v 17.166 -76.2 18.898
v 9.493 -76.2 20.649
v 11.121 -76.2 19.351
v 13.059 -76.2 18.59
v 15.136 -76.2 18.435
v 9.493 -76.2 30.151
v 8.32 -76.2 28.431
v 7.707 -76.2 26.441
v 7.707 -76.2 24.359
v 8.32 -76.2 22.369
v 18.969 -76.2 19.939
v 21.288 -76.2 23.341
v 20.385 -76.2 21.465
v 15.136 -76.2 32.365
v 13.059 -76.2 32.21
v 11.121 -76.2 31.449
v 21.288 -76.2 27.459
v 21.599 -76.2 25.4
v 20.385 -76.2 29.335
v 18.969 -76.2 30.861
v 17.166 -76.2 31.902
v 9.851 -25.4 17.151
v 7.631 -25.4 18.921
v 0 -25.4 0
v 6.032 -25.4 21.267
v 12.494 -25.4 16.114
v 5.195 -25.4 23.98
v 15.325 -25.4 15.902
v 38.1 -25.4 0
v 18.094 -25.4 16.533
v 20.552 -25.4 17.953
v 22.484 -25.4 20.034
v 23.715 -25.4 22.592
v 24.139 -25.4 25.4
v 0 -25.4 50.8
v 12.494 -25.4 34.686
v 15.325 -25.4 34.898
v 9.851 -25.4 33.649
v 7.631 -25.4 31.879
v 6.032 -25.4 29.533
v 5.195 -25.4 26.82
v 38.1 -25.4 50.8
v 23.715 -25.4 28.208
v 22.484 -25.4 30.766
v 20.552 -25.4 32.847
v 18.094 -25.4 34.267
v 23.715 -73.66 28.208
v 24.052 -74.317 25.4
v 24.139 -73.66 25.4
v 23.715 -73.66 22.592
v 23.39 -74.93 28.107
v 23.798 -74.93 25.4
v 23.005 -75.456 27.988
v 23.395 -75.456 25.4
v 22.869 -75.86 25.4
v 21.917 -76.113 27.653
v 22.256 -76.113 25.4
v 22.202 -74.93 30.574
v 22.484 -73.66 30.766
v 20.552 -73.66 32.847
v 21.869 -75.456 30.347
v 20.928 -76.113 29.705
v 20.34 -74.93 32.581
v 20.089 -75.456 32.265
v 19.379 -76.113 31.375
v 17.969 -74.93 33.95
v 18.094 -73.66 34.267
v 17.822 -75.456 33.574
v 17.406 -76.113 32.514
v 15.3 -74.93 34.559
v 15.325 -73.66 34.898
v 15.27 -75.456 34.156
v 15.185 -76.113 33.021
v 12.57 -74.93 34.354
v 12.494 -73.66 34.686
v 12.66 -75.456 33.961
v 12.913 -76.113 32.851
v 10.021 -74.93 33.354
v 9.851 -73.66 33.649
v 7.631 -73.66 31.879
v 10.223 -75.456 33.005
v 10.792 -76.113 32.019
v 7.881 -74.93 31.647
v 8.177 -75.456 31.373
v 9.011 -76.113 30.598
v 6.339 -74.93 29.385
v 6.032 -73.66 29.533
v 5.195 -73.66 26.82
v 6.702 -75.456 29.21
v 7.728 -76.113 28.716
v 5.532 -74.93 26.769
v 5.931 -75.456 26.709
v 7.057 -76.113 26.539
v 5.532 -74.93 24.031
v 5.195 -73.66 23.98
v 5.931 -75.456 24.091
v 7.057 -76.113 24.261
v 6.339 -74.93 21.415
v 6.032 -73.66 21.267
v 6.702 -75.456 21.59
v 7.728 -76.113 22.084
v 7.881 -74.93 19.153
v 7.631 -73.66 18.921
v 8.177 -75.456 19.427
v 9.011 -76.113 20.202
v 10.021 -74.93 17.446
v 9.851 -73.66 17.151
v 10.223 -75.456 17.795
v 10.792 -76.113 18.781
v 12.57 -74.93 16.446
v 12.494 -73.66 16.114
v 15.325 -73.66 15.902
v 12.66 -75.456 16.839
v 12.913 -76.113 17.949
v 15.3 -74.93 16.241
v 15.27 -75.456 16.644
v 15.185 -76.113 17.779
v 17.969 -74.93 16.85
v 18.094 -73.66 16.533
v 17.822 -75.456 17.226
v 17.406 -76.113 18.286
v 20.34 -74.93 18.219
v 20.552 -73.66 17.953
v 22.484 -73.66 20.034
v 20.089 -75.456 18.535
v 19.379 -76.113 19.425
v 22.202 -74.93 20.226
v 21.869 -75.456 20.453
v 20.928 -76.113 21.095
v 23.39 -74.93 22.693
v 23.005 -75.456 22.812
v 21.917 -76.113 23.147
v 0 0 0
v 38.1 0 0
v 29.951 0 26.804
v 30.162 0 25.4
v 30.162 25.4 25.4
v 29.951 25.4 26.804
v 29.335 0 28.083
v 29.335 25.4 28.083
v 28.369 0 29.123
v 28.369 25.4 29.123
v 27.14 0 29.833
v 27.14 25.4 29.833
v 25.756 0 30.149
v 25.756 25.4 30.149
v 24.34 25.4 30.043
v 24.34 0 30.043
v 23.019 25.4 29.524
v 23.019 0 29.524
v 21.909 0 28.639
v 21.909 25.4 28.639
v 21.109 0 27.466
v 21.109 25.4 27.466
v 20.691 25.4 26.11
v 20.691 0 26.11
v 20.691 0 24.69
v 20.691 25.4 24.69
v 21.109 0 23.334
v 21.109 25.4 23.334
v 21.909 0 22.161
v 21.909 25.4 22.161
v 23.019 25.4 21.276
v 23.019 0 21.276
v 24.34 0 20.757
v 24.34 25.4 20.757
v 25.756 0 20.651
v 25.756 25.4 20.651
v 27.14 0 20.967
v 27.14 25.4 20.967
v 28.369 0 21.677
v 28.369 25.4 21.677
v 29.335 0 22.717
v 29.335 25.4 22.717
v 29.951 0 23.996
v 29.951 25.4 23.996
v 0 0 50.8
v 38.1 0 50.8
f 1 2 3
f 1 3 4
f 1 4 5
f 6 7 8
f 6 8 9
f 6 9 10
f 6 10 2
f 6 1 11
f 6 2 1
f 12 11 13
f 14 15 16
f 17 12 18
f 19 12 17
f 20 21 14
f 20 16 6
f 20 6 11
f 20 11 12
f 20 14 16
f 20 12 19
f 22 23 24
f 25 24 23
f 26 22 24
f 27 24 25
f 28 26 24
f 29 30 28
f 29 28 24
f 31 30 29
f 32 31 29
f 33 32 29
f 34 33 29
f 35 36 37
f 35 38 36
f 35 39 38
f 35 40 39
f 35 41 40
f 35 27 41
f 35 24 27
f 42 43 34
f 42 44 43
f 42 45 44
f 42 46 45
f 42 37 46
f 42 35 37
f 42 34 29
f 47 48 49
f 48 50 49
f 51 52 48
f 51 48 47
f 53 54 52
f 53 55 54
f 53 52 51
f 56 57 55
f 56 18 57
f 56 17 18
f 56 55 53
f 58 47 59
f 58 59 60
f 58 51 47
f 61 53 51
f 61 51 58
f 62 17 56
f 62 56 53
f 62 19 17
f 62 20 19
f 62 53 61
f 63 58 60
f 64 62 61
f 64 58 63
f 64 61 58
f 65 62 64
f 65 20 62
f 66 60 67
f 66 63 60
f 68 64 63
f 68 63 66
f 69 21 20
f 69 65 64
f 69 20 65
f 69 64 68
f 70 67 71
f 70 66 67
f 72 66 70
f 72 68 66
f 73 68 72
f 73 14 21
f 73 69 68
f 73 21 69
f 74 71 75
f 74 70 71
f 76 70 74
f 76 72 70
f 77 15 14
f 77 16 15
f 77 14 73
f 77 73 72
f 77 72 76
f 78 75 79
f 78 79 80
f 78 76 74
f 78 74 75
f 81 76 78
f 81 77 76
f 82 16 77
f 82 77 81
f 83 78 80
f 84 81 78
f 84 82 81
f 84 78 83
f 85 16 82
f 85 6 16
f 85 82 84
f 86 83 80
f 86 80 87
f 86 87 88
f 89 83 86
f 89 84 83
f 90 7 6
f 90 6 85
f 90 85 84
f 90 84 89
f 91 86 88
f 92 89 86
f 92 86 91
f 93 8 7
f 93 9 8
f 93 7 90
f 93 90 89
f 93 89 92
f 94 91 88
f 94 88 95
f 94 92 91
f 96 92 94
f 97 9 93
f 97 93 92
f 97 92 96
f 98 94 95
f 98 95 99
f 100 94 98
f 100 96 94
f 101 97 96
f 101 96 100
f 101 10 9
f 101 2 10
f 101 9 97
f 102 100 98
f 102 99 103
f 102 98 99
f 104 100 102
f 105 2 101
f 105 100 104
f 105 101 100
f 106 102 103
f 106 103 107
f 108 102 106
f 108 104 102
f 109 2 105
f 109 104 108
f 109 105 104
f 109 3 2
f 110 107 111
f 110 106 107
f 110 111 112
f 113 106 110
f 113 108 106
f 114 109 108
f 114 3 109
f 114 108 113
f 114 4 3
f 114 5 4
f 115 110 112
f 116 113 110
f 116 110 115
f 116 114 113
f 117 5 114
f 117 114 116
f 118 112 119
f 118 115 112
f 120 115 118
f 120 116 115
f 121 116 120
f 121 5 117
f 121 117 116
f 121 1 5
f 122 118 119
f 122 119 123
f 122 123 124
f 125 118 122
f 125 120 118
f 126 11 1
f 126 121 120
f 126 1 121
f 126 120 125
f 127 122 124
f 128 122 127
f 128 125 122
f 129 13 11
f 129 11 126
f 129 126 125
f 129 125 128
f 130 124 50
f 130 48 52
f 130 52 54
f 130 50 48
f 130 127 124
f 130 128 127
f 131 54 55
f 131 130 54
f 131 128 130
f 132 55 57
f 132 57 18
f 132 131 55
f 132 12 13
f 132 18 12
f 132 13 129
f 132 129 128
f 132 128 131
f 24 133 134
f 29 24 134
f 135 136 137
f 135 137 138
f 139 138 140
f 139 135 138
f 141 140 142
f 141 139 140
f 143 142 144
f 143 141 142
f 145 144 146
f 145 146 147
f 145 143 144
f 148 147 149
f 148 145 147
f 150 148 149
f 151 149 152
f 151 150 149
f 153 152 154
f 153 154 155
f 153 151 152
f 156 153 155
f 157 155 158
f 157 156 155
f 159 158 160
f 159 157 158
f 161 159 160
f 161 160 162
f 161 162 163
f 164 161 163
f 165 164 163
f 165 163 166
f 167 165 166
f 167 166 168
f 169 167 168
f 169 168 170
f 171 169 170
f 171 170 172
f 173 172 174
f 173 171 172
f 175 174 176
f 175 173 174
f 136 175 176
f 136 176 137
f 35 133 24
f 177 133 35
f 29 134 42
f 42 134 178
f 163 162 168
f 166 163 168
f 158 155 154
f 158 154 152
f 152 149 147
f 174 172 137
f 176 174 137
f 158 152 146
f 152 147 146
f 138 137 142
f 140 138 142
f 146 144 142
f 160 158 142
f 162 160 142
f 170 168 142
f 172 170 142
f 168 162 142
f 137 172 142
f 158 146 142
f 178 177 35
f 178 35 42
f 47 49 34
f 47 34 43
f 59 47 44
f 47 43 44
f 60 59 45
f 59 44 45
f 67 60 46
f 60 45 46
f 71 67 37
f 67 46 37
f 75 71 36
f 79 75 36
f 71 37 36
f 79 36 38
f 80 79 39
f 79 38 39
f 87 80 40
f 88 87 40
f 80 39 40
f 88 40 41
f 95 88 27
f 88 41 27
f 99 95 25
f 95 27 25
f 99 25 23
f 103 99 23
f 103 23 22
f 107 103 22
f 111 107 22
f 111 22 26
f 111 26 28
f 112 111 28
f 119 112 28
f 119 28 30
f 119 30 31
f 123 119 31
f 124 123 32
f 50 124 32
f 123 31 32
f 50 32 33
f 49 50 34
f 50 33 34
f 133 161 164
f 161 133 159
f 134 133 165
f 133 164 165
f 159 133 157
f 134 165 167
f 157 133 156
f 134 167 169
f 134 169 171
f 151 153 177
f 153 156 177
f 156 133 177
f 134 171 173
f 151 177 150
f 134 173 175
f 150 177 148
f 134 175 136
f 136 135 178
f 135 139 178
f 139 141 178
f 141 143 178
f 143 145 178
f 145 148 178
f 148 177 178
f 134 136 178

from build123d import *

# Parameters (mm, degrees)
F0_W     = 38.1
F0_H     = 50.8
F1_DEPTH = 25.4
F2_R     = 9.525
F3_DEPTH = 50.8
F4_R     = 2.54
F6_R     = 4.7625
F7_DEPTH = 25.4


with BuildPart() as f1:
    # F0 (on Front) → F1 (new body)
    with BuildSketch(Plane.XZ):
        with Locations((19.05, 25.4)):
            Rectangle(F0_W, F0_H)
    extrude(amount=F1_DEPTH)

    # F2 (on face) → F3 (join)
    with BuildSketch(Plane.XZ.offset(25.4)):
        with Locations((14.613638, 25.4)):
            Circle(F2_R)
    extrude(amount=F3_DEPTH)

    # F4
    f4_edges = [f1.edges().sort_by_distance(p)[0] for p in [
        (5.088638, -76.2, 25.4),
    ]]
    fillet(f4_edges, radius=F4_R)

    # F6 (on face) → F7 (join)
    with BuildSketch(Plane.XZ):
        with Locations((25.4, 25.4)):
            Circle(F6_R)
    extrude(amount=-F7_DEPTH)


solid = f1.part
